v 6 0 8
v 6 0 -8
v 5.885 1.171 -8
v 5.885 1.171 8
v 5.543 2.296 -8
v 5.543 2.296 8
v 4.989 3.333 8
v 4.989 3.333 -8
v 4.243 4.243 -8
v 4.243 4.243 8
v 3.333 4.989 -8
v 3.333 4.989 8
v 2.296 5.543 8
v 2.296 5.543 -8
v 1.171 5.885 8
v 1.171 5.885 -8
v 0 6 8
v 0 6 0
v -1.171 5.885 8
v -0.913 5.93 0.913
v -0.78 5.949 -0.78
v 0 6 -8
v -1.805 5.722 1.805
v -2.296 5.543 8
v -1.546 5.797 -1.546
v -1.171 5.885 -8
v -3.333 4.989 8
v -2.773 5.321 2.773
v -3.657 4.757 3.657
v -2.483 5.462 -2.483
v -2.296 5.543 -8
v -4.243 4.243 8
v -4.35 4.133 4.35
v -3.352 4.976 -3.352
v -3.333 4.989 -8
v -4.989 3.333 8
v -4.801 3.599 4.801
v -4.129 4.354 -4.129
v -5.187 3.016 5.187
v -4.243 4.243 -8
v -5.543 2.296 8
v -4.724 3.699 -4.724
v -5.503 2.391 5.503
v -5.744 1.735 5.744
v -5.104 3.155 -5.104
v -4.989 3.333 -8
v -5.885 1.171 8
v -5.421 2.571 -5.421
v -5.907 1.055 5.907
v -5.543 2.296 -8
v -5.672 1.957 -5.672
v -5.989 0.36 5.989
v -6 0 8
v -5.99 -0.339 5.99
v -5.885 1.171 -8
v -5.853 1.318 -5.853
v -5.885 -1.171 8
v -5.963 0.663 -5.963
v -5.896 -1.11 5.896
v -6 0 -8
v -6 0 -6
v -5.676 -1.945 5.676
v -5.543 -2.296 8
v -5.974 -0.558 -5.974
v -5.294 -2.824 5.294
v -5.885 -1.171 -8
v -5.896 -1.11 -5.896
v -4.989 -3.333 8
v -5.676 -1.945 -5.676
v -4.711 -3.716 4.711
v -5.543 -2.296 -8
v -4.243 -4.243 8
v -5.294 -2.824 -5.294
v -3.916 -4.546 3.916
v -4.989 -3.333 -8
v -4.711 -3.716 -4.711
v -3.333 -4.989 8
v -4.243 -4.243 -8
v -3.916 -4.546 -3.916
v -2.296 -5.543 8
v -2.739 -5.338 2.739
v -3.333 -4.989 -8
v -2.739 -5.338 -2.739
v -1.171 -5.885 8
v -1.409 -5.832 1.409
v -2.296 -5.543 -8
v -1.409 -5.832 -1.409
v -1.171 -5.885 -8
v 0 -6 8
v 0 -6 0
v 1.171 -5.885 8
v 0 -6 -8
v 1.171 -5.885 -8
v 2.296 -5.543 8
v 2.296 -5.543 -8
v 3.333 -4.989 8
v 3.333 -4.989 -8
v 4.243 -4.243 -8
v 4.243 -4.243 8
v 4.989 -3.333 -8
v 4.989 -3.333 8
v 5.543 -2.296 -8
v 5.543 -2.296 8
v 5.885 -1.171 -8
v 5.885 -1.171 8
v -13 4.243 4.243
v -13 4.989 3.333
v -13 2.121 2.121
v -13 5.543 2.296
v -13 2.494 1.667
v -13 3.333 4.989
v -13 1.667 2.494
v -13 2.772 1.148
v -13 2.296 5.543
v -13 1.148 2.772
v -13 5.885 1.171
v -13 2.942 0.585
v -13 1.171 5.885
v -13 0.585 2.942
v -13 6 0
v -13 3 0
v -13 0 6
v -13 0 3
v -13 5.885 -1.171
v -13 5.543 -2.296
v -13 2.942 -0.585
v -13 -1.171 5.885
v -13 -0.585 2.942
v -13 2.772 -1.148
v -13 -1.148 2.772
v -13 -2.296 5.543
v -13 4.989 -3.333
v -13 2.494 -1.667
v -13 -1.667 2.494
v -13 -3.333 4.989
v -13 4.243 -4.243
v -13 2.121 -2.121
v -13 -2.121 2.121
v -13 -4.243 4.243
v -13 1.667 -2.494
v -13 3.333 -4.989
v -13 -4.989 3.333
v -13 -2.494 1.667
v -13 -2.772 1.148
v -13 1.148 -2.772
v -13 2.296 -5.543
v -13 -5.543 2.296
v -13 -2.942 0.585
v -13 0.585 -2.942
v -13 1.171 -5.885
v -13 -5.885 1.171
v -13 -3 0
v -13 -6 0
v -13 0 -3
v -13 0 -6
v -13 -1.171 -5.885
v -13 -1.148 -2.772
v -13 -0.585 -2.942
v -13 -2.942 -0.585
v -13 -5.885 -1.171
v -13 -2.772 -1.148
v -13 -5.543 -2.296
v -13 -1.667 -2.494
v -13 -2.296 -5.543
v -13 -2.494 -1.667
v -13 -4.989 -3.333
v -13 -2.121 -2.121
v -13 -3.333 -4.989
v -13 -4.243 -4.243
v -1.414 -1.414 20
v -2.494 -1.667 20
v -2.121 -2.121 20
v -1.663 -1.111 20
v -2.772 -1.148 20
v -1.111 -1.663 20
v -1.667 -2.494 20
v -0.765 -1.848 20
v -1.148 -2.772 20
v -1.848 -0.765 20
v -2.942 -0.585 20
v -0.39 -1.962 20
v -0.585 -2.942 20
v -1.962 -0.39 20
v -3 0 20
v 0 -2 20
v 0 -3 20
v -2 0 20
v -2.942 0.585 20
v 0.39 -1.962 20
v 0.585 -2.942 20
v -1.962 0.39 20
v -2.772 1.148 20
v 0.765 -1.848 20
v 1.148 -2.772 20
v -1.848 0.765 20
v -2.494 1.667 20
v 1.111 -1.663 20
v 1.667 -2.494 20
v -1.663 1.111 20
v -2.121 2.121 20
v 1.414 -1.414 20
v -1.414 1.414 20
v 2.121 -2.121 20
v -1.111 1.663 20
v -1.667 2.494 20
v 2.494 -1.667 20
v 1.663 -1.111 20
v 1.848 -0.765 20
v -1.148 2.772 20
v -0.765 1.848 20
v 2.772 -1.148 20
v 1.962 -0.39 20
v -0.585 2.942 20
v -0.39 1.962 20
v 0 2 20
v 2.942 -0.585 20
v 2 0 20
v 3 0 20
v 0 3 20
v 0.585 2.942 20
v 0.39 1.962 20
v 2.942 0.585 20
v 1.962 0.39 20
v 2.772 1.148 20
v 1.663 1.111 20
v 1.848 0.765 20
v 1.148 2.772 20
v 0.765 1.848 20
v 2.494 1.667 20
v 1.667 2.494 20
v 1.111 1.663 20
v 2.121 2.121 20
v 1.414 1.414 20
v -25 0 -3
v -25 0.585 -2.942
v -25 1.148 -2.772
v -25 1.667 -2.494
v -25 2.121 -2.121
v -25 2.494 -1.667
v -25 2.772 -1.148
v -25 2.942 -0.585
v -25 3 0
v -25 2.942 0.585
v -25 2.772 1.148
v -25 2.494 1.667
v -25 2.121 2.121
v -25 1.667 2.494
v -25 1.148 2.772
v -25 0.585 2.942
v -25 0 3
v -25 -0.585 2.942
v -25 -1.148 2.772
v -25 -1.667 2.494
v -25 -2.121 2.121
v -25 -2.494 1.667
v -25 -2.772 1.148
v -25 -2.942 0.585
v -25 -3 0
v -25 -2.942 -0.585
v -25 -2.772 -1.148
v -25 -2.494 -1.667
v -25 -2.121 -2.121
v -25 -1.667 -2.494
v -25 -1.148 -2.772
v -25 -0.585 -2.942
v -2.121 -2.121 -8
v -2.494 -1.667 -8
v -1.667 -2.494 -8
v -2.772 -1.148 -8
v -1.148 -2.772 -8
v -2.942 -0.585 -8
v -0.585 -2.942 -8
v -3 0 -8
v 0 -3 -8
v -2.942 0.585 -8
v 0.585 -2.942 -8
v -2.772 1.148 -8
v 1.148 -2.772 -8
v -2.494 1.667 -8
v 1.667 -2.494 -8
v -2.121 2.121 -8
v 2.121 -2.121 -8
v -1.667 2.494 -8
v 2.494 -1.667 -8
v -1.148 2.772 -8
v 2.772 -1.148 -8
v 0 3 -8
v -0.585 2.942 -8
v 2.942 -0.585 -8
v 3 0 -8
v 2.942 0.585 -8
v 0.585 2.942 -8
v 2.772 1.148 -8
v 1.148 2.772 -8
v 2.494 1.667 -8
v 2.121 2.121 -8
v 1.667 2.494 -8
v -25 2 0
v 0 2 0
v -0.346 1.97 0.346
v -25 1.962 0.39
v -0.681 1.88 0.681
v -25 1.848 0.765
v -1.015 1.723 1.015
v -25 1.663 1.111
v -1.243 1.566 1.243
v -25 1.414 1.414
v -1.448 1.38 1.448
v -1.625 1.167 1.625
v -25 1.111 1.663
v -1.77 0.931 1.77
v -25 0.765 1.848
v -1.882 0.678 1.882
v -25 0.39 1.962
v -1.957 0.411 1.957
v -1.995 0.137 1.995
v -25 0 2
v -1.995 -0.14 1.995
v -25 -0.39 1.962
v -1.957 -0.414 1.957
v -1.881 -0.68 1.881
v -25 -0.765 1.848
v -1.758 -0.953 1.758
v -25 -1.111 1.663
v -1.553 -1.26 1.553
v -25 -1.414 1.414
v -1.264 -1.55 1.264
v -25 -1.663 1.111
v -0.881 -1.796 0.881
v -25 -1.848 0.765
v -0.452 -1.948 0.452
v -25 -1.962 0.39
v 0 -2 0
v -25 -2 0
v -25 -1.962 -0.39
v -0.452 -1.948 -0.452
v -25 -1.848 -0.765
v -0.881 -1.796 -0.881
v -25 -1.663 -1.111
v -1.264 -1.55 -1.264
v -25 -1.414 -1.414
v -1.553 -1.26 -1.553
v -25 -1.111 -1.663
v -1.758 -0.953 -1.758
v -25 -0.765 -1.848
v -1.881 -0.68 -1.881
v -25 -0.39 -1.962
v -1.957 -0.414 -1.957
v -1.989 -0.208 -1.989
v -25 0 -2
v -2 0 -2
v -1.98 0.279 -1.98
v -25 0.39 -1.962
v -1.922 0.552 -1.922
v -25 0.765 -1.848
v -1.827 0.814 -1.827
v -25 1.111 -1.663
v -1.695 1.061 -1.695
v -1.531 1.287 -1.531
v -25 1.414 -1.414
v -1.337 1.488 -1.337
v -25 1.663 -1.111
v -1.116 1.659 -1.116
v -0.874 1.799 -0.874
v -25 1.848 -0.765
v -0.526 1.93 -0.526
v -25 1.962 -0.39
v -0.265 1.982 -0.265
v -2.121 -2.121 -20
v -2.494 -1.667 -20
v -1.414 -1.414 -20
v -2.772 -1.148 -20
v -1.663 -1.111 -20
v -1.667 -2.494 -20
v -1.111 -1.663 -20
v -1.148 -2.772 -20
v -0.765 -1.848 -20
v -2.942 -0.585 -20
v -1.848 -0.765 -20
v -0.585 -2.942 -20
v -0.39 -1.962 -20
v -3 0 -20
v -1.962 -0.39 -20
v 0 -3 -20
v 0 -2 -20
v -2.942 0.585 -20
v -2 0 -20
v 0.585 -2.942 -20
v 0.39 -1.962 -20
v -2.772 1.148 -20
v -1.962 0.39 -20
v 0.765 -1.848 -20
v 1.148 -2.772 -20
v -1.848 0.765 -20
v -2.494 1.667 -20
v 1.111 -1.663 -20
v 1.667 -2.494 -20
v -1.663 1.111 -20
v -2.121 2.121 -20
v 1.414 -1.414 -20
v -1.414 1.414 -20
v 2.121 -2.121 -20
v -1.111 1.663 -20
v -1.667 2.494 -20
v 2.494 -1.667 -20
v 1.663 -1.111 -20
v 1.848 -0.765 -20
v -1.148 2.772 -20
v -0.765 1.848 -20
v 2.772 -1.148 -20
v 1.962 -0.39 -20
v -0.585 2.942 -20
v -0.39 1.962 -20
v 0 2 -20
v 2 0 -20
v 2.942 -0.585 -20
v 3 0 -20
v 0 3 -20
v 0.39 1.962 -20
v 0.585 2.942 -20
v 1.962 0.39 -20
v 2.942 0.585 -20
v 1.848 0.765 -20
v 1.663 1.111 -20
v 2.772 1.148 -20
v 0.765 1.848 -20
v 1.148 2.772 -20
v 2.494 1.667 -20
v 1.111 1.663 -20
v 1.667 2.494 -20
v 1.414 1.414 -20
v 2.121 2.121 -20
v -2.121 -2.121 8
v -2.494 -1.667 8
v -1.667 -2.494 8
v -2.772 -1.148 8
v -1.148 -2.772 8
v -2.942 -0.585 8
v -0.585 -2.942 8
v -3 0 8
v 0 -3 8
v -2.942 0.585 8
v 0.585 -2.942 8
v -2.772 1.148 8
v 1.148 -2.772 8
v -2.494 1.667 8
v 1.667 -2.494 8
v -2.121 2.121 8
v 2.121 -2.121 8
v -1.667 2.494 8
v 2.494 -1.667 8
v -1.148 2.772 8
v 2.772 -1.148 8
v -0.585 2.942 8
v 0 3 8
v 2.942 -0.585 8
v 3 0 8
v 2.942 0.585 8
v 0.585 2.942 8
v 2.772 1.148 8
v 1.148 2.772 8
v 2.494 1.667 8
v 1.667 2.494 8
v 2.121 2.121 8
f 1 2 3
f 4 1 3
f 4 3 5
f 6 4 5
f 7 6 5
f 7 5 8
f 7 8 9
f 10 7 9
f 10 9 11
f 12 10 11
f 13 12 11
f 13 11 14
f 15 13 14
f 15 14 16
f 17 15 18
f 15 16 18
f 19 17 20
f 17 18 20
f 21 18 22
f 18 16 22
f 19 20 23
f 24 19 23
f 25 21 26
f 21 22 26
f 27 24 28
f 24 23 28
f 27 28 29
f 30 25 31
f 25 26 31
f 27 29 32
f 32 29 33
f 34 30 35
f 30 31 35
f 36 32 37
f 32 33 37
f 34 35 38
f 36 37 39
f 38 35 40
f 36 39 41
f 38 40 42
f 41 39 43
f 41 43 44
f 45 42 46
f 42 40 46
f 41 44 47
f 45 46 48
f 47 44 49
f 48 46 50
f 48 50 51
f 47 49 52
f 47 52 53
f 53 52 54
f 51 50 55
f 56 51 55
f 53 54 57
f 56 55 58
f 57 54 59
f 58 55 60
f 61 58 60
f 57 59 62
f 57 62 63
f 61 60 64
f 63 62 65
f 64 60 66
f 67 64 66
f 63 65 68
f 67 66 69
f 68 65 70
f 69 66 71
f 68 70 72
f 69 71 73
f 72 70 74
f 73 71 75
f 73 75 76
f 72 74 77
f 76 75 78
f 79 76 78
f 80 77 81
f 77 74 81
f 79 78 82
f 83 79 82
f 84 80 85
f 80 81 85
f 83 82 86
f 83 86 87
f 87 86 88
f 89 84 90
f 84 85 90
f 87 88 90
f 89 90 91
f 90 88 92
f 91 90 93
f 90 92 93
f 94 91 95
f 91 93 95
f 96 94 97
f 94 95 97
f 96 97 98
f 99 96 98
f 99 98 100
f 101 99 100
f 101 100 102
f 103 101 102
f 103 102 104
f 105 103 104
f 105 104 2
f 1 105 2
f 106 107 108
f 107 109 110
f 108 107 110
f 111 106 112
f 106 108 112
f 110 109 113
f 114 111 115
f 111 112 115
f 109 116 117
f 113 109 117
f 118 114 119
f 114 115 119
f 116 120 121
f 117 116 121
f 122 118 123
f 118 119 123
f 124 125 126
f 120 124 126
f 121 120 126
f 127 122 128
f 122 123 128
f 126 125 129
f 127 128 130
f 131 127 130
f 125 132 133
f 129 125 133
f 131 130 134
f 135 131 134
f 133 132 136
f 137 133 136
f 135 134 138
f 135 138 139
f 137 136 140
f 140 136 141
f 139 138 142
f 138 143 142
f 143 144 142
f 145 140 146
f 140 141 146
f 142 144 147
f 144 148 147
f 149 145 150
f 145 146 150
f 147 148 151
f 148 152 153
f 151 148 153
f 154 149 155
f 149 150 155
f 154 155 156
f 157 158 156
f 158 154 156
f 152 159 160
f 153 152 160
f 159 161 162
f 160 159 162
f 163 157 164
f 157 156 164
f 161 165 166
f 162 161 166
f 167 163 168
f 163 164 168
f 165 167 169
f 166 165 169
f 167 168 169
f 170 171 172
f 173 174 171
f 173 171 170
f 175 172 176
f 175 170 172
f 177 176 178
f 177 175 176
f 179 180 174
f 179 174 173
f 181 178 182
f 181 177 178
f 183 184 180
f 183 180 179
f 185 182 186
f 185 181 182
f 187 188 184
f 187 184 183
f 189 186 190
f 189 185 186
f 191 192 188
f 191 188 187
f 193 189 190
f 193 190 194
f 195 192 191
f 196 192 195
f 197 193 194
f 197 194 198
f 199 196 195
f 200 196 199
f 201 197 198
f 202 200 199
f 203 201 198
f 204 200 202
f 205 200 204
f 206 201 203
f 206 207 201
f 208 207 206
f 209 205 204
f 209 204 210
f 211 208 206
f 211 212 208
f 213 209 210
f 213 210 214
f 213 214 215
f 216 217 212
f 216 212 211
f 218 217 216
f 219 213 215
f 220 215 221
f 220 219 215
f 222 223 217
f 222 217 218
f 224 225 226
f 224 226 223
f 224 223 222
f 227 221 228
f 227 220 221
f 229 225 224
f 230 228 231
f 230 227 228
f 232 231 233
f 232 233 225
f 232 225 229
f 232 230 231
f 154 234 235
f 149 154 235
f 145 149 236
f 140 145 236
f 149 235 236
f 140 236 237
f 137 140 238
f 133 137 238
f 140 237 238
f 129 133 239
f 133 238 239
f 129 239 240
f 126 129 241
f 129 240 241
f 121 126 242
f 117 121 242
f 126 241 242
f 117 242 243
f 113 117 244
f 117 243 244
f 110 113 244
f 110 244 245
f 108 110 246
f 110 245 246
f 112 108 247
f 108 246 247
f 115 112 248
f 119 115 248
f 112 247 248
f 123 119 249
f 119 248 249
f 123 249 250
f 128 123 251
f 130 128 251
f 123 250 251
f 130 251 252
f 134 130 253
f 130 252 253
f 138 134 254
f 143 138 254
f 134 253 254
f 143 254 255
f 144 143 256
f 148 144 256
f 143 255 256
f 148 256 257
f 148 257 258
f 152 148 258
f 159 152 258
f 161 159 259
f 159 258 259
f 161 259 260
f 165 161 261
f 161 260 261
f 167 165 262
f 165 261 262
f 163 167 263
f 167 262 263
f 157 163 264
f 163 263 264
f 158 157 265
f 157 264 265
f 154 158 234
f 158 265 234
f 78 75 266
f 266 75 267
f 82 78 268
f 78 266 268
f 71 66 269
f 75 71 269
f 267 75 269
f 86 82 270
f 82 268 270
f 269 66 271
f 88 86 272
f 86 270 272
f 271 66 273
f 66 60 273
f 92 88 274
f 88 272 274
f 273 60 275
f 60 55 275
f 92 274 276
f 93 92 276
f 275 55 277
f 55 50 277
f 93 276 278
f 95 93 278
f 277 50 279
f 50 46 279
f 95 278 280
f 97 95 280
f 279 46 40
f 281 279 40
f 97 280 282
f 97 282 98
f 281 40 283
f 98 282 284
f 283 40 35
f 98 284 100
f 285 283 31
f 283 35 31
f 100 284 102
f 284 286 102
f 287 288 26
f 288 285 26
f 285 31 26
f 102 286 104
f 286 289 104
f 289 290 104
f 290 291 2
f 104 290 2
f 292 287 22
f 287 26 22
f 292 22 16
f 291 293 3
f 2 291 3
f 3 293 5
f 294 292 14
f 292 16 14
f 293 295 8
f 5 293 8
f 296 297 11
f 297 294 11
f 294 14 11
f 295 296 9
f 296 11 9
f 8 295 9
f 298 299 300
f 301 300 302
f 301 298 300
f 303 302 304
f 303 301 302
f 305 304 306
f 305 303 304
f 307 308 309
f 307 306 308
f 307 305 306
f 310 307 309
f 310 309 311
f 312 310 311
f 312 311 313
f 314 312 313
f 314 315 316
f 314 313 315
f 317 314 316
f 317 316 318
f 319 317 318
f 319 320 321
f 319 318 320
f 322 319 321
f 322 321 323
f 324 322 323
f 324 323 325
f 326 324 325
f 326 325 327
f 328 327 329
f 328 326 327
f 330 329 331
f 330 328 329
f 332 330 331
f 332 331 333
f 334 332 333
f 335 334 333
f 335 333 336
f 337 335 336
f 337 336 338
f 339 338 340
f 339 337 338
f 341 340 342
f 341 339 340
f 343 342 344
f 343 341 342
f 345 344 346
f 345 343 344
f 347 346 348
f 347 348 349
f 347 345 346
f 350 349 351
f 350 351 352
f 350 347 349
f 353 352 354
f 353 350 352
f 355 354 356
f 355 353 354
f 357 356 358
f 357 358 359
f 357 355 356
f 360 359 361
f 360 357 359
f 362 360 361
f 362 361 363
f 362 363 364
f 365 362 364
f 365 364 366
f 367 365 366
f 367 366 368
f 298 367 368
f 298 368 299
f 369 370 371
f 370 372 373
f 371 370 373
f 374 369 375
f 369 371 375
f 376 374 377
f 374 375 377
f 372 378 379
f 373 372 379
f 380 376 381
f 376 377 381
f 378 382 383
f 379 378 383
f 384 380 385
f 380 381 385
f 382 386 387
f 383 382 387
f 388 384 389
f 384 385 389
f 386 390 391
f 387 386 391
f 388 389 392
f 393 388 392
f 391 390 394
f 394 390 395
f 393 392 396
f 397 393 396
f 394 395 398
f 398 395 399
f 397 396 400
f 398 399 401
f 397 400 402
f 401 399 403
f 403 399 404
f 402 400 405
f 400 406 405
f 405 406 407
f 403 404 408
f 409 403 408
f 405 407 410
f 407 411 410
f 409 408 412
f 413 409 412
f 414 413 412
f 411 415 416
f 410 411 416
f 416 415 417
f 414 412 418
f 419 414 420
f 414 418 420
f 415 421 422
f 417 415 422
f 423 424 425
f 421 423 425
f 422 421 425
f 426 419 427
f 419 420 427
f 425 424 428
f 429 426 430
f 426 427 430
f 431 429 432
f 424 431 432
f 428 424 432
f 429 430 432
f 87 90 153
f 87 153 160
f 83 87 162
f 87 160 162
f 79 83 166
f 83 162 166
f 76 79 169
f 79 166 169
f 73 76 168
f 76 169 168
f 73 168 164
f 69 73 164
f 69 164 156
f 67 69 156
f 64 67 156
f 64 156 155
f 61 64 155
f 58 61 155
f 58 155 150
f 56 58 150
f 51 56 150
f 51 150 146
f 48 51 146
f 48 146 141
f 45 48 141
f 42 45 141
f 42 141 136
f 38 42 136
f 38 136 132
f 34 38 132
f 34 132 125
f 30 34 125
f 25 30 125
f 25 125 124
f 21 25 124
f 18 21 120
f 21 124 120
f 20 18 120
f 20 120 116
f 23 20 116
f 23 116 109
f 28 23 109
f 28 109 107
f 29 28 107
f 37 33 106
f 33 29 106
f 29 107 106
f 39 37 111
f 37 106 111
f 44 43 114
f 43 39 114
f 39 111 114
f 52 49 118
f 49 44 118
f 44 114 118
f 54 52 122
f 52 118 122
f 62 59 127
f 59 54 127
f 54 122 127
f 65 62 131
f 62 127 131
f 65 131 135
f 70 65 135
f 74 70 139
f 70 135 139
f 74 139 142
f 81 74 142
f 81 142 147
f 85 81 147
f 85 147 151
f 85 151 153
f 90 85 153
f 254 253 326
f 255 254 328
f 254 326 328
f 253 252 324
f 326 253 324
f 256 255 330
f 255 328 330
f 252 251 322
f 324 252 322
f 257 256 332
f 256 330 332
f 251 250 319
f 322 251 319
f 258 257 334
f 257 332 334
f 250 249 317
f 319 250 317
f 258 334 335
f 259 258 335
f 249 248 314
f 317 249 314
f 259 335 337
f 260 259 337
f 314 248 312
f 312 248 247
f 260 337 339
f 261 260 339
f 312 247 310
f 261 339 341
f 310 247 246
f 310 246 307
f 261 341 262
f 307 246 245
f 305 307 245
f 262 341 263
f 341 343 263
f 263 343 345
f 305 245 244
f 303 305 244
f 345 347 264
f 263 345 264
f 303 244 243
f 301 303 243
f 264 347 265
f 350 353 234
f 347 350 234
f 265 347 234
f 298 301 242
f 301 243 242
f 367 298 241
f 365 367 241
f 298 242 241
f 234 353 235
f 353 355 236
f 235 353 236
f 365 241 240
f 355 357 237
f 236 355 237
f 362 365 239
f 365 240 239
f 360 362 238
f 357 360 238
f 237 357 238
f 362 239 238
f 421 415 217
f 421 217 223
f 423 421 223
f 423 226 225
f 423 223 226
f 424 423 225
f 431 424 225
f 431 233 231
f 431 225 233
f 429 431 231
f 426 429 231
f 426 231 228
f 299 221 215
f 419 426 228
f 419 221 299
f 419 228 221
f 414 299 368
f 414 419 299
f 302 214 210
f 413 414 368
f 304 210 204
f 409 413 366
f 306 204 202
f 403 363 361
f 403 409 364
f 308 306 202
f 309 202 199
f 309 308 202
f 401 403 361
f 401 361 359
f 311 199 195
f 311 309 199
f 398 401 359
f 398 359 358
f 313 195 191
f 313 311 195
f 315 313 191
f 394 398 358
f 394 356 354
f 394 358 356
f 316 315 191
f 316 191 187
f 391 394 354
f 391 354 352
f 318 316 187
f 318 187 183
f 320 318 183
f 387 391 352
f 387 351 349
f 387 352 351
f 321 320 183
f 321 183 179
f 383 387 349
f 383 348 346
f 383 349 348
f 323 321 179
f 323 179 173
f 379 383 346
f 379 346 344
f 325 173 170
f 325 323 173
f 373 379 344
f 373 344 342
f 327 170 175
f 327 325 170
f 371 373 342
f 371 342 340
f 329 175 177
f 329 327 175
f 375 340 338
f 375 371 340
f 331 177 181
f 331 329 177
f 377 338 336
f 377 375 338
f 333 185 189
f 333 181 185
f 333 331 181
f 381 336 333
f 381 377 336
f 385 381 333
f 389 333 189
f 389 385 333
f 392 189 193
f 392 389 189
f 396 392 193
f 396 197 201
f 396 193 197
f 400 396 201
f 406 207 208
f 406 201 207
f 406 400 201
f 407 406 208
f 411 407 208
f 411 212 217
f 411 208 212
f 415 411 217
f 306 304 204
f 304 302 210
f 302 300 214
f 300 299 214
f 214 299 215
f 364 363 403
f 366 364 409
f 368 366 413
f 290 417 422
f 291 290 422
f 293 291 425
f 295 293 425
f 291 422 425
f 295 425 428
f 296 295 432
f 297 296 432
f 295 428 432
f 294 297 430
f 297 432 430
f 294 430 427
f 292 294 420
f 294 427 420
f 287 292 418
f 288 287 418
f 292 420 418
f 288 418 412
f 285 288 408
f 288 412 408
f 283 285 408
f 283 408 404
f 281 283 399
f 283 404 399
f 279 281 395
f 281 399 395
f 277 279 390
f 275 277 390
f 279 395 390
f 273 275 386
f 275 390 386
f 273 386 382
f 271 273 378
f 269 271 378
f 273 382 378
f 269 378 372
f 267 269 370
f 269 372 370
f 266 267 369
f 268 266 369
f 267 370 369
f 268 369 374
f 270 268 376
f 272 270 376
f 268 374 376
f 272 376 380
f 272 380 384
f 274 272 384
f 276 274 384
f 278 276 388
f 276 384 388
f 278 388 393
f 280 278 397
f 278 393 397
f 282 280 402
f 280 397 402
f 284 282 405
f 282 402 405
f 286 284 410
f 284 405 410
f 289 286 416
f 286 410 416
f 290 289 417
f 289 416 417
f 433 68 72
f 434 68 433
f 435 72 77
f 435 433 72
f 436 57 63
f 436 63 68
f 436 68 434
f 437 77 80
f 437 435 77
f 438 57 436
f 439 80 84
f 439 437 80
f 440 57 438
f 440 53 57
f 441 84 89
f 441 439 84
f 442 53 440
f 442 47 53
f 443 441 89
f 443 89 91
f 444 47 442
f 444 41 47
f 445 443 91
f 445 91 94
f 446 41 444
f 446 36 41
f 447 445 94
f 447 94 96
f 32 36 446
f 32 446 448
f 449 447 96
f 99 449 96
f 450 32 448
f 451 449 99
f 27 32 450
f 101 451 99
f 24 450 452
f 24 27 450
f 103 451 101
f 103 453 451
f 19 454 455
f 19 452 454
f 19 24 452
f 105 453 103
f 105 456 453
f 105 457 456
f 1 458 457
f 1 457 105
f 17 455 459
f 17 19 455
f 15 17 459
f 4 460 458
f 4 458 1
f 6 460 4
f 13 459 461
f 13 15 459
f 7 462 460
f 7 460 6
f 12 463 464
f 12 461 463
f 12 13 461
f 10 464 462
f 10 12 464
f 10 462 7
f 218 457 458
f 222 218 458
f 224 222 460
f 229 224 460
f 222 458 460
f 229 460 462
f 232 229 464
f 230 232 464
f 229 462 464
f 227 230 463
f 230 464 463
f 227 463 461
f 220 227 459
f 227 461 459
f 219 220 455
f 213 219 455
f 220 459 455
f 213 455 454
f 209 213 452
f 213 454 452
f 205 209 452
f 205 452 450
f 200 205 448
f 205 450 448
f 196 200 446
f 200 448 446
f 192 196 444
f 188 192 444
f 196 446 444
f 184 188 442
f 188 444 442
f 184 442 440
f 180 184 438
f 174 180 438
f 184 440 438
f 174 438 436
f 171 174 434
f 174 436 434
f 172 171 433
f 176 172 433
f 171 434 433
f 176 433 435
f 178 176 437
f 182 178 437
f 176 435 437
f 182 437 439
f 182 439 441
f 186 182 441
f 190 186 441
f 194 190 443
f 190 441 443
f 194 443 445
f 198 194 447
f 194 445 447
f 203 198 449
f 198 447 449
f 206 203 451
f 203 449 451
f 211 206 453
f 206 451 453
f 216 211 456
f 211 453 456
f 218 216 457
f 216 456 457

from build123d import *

# Parameters (mm, degrees)
RUN_HUB_START       = -8
SKETCH1_R           = 6
RUN_HUB_DEPTH       = 16
BRANCH_HUB_START    = -13
SKETCH2_R           = 6
BRANCH_HUB_DEPTH    = 13
BARB_FRONT_START    = 8
SKETCH3_R           = 3
BARB_FRONT_DEPTH    = 12
BARB_BACK_START     = -20
SKETCH4_R           = 3
BARB_BACK_DEPTH     = 12
BARB_BRANCH_START   = -25
SKETCH5_R           = 3
BARB_BRANCH_DEPTH   = 12
RUN_BORE_DEPTH      = 33.57299495
RUN_BORE_DEPTH_BACK = 33.57299495
SKETCH6_R           = 2
BRANCH_BORE_START   = -26
SKETCH7_R           = 2
BRANCH_BORE_DEPTH   = 26


with BuildPart() as part:
    # Sketch1 → Run_Hub (new body)
    with BuildSketch(Plane.XY.offset(RUN_HUB_START)):
        Circle(SKETCH1_R)
    extrude(amount=RUN_HUB_DEPTH)

    # Sketch2 → Branch_Hub (add)
    with BuildSketch(Plane(origin=(0, 0, 0), x_dir=(0, 0, -1), z_dir=(1, 0, 0)).offset(BRANCH_HUB_START)):
        with Locations(Location((0, 0, 0), (0, 0, 270))):
            Circle(SKETCH2_R)
    extrude(amount=BRANCH_HUB_DEPTH)

    # Sketch3 → Barb_Front (add)
    with BuildSketch(Plane.XY.offset(BARB_FRONT_START)):
        Circle(SKETCH3_R)
    extrude(amount=BARB_FRONT_DEPTH)

    # Sketch4 → Barb_Back (add)
    with BuildSketch(Plane.XY.offset(BARB_BACK_START)):
        Circle(SKETCH4_R)
    extrude(amount=BARB_BACK_DEPTH)

    # Sketch5 → Barb_Branch (add)
    with BuildSketch(Plane(origin=(0, 0, 0), x_dir=(0, 0, -1), z_dir=(1, 0, 0)).offset(BARB_BRANCH_START)):
        Circle(SKETCH5_R)
    extrude(amount=BARB_BRANCH_DEPTH)

    # Sketch6 → Run_Bore (cut, two sides: drawn at the far end of the back side and taken through both)
    with BuildSketch(Plane.XY.offset(-RUN_BORE_DEPTH_BACK)):
        Circle(SKETCH6_R)
    extrude(amount=RUN_BORE_DEPTH + RUN_BORE_DEPTH_BACK, mode=Mode.SUBTRACT)

    # Sketch7 → Branch_Bore (cut)
    with BuildSketch(Plane(origin=(0, 0, 0), x_dir=(0, 0, -1), z_dir=(1, 0, 0)).offset(BRANCH_BORE_START)):
        with Locations(Location((0, 0, 0), (0, 0, 90))):
            Circle(SKETCH7_R)
    extrude(amount=BRANCH_BORE_DEPTH, mode=Mode.SUBTRACT)


solid = part.part
